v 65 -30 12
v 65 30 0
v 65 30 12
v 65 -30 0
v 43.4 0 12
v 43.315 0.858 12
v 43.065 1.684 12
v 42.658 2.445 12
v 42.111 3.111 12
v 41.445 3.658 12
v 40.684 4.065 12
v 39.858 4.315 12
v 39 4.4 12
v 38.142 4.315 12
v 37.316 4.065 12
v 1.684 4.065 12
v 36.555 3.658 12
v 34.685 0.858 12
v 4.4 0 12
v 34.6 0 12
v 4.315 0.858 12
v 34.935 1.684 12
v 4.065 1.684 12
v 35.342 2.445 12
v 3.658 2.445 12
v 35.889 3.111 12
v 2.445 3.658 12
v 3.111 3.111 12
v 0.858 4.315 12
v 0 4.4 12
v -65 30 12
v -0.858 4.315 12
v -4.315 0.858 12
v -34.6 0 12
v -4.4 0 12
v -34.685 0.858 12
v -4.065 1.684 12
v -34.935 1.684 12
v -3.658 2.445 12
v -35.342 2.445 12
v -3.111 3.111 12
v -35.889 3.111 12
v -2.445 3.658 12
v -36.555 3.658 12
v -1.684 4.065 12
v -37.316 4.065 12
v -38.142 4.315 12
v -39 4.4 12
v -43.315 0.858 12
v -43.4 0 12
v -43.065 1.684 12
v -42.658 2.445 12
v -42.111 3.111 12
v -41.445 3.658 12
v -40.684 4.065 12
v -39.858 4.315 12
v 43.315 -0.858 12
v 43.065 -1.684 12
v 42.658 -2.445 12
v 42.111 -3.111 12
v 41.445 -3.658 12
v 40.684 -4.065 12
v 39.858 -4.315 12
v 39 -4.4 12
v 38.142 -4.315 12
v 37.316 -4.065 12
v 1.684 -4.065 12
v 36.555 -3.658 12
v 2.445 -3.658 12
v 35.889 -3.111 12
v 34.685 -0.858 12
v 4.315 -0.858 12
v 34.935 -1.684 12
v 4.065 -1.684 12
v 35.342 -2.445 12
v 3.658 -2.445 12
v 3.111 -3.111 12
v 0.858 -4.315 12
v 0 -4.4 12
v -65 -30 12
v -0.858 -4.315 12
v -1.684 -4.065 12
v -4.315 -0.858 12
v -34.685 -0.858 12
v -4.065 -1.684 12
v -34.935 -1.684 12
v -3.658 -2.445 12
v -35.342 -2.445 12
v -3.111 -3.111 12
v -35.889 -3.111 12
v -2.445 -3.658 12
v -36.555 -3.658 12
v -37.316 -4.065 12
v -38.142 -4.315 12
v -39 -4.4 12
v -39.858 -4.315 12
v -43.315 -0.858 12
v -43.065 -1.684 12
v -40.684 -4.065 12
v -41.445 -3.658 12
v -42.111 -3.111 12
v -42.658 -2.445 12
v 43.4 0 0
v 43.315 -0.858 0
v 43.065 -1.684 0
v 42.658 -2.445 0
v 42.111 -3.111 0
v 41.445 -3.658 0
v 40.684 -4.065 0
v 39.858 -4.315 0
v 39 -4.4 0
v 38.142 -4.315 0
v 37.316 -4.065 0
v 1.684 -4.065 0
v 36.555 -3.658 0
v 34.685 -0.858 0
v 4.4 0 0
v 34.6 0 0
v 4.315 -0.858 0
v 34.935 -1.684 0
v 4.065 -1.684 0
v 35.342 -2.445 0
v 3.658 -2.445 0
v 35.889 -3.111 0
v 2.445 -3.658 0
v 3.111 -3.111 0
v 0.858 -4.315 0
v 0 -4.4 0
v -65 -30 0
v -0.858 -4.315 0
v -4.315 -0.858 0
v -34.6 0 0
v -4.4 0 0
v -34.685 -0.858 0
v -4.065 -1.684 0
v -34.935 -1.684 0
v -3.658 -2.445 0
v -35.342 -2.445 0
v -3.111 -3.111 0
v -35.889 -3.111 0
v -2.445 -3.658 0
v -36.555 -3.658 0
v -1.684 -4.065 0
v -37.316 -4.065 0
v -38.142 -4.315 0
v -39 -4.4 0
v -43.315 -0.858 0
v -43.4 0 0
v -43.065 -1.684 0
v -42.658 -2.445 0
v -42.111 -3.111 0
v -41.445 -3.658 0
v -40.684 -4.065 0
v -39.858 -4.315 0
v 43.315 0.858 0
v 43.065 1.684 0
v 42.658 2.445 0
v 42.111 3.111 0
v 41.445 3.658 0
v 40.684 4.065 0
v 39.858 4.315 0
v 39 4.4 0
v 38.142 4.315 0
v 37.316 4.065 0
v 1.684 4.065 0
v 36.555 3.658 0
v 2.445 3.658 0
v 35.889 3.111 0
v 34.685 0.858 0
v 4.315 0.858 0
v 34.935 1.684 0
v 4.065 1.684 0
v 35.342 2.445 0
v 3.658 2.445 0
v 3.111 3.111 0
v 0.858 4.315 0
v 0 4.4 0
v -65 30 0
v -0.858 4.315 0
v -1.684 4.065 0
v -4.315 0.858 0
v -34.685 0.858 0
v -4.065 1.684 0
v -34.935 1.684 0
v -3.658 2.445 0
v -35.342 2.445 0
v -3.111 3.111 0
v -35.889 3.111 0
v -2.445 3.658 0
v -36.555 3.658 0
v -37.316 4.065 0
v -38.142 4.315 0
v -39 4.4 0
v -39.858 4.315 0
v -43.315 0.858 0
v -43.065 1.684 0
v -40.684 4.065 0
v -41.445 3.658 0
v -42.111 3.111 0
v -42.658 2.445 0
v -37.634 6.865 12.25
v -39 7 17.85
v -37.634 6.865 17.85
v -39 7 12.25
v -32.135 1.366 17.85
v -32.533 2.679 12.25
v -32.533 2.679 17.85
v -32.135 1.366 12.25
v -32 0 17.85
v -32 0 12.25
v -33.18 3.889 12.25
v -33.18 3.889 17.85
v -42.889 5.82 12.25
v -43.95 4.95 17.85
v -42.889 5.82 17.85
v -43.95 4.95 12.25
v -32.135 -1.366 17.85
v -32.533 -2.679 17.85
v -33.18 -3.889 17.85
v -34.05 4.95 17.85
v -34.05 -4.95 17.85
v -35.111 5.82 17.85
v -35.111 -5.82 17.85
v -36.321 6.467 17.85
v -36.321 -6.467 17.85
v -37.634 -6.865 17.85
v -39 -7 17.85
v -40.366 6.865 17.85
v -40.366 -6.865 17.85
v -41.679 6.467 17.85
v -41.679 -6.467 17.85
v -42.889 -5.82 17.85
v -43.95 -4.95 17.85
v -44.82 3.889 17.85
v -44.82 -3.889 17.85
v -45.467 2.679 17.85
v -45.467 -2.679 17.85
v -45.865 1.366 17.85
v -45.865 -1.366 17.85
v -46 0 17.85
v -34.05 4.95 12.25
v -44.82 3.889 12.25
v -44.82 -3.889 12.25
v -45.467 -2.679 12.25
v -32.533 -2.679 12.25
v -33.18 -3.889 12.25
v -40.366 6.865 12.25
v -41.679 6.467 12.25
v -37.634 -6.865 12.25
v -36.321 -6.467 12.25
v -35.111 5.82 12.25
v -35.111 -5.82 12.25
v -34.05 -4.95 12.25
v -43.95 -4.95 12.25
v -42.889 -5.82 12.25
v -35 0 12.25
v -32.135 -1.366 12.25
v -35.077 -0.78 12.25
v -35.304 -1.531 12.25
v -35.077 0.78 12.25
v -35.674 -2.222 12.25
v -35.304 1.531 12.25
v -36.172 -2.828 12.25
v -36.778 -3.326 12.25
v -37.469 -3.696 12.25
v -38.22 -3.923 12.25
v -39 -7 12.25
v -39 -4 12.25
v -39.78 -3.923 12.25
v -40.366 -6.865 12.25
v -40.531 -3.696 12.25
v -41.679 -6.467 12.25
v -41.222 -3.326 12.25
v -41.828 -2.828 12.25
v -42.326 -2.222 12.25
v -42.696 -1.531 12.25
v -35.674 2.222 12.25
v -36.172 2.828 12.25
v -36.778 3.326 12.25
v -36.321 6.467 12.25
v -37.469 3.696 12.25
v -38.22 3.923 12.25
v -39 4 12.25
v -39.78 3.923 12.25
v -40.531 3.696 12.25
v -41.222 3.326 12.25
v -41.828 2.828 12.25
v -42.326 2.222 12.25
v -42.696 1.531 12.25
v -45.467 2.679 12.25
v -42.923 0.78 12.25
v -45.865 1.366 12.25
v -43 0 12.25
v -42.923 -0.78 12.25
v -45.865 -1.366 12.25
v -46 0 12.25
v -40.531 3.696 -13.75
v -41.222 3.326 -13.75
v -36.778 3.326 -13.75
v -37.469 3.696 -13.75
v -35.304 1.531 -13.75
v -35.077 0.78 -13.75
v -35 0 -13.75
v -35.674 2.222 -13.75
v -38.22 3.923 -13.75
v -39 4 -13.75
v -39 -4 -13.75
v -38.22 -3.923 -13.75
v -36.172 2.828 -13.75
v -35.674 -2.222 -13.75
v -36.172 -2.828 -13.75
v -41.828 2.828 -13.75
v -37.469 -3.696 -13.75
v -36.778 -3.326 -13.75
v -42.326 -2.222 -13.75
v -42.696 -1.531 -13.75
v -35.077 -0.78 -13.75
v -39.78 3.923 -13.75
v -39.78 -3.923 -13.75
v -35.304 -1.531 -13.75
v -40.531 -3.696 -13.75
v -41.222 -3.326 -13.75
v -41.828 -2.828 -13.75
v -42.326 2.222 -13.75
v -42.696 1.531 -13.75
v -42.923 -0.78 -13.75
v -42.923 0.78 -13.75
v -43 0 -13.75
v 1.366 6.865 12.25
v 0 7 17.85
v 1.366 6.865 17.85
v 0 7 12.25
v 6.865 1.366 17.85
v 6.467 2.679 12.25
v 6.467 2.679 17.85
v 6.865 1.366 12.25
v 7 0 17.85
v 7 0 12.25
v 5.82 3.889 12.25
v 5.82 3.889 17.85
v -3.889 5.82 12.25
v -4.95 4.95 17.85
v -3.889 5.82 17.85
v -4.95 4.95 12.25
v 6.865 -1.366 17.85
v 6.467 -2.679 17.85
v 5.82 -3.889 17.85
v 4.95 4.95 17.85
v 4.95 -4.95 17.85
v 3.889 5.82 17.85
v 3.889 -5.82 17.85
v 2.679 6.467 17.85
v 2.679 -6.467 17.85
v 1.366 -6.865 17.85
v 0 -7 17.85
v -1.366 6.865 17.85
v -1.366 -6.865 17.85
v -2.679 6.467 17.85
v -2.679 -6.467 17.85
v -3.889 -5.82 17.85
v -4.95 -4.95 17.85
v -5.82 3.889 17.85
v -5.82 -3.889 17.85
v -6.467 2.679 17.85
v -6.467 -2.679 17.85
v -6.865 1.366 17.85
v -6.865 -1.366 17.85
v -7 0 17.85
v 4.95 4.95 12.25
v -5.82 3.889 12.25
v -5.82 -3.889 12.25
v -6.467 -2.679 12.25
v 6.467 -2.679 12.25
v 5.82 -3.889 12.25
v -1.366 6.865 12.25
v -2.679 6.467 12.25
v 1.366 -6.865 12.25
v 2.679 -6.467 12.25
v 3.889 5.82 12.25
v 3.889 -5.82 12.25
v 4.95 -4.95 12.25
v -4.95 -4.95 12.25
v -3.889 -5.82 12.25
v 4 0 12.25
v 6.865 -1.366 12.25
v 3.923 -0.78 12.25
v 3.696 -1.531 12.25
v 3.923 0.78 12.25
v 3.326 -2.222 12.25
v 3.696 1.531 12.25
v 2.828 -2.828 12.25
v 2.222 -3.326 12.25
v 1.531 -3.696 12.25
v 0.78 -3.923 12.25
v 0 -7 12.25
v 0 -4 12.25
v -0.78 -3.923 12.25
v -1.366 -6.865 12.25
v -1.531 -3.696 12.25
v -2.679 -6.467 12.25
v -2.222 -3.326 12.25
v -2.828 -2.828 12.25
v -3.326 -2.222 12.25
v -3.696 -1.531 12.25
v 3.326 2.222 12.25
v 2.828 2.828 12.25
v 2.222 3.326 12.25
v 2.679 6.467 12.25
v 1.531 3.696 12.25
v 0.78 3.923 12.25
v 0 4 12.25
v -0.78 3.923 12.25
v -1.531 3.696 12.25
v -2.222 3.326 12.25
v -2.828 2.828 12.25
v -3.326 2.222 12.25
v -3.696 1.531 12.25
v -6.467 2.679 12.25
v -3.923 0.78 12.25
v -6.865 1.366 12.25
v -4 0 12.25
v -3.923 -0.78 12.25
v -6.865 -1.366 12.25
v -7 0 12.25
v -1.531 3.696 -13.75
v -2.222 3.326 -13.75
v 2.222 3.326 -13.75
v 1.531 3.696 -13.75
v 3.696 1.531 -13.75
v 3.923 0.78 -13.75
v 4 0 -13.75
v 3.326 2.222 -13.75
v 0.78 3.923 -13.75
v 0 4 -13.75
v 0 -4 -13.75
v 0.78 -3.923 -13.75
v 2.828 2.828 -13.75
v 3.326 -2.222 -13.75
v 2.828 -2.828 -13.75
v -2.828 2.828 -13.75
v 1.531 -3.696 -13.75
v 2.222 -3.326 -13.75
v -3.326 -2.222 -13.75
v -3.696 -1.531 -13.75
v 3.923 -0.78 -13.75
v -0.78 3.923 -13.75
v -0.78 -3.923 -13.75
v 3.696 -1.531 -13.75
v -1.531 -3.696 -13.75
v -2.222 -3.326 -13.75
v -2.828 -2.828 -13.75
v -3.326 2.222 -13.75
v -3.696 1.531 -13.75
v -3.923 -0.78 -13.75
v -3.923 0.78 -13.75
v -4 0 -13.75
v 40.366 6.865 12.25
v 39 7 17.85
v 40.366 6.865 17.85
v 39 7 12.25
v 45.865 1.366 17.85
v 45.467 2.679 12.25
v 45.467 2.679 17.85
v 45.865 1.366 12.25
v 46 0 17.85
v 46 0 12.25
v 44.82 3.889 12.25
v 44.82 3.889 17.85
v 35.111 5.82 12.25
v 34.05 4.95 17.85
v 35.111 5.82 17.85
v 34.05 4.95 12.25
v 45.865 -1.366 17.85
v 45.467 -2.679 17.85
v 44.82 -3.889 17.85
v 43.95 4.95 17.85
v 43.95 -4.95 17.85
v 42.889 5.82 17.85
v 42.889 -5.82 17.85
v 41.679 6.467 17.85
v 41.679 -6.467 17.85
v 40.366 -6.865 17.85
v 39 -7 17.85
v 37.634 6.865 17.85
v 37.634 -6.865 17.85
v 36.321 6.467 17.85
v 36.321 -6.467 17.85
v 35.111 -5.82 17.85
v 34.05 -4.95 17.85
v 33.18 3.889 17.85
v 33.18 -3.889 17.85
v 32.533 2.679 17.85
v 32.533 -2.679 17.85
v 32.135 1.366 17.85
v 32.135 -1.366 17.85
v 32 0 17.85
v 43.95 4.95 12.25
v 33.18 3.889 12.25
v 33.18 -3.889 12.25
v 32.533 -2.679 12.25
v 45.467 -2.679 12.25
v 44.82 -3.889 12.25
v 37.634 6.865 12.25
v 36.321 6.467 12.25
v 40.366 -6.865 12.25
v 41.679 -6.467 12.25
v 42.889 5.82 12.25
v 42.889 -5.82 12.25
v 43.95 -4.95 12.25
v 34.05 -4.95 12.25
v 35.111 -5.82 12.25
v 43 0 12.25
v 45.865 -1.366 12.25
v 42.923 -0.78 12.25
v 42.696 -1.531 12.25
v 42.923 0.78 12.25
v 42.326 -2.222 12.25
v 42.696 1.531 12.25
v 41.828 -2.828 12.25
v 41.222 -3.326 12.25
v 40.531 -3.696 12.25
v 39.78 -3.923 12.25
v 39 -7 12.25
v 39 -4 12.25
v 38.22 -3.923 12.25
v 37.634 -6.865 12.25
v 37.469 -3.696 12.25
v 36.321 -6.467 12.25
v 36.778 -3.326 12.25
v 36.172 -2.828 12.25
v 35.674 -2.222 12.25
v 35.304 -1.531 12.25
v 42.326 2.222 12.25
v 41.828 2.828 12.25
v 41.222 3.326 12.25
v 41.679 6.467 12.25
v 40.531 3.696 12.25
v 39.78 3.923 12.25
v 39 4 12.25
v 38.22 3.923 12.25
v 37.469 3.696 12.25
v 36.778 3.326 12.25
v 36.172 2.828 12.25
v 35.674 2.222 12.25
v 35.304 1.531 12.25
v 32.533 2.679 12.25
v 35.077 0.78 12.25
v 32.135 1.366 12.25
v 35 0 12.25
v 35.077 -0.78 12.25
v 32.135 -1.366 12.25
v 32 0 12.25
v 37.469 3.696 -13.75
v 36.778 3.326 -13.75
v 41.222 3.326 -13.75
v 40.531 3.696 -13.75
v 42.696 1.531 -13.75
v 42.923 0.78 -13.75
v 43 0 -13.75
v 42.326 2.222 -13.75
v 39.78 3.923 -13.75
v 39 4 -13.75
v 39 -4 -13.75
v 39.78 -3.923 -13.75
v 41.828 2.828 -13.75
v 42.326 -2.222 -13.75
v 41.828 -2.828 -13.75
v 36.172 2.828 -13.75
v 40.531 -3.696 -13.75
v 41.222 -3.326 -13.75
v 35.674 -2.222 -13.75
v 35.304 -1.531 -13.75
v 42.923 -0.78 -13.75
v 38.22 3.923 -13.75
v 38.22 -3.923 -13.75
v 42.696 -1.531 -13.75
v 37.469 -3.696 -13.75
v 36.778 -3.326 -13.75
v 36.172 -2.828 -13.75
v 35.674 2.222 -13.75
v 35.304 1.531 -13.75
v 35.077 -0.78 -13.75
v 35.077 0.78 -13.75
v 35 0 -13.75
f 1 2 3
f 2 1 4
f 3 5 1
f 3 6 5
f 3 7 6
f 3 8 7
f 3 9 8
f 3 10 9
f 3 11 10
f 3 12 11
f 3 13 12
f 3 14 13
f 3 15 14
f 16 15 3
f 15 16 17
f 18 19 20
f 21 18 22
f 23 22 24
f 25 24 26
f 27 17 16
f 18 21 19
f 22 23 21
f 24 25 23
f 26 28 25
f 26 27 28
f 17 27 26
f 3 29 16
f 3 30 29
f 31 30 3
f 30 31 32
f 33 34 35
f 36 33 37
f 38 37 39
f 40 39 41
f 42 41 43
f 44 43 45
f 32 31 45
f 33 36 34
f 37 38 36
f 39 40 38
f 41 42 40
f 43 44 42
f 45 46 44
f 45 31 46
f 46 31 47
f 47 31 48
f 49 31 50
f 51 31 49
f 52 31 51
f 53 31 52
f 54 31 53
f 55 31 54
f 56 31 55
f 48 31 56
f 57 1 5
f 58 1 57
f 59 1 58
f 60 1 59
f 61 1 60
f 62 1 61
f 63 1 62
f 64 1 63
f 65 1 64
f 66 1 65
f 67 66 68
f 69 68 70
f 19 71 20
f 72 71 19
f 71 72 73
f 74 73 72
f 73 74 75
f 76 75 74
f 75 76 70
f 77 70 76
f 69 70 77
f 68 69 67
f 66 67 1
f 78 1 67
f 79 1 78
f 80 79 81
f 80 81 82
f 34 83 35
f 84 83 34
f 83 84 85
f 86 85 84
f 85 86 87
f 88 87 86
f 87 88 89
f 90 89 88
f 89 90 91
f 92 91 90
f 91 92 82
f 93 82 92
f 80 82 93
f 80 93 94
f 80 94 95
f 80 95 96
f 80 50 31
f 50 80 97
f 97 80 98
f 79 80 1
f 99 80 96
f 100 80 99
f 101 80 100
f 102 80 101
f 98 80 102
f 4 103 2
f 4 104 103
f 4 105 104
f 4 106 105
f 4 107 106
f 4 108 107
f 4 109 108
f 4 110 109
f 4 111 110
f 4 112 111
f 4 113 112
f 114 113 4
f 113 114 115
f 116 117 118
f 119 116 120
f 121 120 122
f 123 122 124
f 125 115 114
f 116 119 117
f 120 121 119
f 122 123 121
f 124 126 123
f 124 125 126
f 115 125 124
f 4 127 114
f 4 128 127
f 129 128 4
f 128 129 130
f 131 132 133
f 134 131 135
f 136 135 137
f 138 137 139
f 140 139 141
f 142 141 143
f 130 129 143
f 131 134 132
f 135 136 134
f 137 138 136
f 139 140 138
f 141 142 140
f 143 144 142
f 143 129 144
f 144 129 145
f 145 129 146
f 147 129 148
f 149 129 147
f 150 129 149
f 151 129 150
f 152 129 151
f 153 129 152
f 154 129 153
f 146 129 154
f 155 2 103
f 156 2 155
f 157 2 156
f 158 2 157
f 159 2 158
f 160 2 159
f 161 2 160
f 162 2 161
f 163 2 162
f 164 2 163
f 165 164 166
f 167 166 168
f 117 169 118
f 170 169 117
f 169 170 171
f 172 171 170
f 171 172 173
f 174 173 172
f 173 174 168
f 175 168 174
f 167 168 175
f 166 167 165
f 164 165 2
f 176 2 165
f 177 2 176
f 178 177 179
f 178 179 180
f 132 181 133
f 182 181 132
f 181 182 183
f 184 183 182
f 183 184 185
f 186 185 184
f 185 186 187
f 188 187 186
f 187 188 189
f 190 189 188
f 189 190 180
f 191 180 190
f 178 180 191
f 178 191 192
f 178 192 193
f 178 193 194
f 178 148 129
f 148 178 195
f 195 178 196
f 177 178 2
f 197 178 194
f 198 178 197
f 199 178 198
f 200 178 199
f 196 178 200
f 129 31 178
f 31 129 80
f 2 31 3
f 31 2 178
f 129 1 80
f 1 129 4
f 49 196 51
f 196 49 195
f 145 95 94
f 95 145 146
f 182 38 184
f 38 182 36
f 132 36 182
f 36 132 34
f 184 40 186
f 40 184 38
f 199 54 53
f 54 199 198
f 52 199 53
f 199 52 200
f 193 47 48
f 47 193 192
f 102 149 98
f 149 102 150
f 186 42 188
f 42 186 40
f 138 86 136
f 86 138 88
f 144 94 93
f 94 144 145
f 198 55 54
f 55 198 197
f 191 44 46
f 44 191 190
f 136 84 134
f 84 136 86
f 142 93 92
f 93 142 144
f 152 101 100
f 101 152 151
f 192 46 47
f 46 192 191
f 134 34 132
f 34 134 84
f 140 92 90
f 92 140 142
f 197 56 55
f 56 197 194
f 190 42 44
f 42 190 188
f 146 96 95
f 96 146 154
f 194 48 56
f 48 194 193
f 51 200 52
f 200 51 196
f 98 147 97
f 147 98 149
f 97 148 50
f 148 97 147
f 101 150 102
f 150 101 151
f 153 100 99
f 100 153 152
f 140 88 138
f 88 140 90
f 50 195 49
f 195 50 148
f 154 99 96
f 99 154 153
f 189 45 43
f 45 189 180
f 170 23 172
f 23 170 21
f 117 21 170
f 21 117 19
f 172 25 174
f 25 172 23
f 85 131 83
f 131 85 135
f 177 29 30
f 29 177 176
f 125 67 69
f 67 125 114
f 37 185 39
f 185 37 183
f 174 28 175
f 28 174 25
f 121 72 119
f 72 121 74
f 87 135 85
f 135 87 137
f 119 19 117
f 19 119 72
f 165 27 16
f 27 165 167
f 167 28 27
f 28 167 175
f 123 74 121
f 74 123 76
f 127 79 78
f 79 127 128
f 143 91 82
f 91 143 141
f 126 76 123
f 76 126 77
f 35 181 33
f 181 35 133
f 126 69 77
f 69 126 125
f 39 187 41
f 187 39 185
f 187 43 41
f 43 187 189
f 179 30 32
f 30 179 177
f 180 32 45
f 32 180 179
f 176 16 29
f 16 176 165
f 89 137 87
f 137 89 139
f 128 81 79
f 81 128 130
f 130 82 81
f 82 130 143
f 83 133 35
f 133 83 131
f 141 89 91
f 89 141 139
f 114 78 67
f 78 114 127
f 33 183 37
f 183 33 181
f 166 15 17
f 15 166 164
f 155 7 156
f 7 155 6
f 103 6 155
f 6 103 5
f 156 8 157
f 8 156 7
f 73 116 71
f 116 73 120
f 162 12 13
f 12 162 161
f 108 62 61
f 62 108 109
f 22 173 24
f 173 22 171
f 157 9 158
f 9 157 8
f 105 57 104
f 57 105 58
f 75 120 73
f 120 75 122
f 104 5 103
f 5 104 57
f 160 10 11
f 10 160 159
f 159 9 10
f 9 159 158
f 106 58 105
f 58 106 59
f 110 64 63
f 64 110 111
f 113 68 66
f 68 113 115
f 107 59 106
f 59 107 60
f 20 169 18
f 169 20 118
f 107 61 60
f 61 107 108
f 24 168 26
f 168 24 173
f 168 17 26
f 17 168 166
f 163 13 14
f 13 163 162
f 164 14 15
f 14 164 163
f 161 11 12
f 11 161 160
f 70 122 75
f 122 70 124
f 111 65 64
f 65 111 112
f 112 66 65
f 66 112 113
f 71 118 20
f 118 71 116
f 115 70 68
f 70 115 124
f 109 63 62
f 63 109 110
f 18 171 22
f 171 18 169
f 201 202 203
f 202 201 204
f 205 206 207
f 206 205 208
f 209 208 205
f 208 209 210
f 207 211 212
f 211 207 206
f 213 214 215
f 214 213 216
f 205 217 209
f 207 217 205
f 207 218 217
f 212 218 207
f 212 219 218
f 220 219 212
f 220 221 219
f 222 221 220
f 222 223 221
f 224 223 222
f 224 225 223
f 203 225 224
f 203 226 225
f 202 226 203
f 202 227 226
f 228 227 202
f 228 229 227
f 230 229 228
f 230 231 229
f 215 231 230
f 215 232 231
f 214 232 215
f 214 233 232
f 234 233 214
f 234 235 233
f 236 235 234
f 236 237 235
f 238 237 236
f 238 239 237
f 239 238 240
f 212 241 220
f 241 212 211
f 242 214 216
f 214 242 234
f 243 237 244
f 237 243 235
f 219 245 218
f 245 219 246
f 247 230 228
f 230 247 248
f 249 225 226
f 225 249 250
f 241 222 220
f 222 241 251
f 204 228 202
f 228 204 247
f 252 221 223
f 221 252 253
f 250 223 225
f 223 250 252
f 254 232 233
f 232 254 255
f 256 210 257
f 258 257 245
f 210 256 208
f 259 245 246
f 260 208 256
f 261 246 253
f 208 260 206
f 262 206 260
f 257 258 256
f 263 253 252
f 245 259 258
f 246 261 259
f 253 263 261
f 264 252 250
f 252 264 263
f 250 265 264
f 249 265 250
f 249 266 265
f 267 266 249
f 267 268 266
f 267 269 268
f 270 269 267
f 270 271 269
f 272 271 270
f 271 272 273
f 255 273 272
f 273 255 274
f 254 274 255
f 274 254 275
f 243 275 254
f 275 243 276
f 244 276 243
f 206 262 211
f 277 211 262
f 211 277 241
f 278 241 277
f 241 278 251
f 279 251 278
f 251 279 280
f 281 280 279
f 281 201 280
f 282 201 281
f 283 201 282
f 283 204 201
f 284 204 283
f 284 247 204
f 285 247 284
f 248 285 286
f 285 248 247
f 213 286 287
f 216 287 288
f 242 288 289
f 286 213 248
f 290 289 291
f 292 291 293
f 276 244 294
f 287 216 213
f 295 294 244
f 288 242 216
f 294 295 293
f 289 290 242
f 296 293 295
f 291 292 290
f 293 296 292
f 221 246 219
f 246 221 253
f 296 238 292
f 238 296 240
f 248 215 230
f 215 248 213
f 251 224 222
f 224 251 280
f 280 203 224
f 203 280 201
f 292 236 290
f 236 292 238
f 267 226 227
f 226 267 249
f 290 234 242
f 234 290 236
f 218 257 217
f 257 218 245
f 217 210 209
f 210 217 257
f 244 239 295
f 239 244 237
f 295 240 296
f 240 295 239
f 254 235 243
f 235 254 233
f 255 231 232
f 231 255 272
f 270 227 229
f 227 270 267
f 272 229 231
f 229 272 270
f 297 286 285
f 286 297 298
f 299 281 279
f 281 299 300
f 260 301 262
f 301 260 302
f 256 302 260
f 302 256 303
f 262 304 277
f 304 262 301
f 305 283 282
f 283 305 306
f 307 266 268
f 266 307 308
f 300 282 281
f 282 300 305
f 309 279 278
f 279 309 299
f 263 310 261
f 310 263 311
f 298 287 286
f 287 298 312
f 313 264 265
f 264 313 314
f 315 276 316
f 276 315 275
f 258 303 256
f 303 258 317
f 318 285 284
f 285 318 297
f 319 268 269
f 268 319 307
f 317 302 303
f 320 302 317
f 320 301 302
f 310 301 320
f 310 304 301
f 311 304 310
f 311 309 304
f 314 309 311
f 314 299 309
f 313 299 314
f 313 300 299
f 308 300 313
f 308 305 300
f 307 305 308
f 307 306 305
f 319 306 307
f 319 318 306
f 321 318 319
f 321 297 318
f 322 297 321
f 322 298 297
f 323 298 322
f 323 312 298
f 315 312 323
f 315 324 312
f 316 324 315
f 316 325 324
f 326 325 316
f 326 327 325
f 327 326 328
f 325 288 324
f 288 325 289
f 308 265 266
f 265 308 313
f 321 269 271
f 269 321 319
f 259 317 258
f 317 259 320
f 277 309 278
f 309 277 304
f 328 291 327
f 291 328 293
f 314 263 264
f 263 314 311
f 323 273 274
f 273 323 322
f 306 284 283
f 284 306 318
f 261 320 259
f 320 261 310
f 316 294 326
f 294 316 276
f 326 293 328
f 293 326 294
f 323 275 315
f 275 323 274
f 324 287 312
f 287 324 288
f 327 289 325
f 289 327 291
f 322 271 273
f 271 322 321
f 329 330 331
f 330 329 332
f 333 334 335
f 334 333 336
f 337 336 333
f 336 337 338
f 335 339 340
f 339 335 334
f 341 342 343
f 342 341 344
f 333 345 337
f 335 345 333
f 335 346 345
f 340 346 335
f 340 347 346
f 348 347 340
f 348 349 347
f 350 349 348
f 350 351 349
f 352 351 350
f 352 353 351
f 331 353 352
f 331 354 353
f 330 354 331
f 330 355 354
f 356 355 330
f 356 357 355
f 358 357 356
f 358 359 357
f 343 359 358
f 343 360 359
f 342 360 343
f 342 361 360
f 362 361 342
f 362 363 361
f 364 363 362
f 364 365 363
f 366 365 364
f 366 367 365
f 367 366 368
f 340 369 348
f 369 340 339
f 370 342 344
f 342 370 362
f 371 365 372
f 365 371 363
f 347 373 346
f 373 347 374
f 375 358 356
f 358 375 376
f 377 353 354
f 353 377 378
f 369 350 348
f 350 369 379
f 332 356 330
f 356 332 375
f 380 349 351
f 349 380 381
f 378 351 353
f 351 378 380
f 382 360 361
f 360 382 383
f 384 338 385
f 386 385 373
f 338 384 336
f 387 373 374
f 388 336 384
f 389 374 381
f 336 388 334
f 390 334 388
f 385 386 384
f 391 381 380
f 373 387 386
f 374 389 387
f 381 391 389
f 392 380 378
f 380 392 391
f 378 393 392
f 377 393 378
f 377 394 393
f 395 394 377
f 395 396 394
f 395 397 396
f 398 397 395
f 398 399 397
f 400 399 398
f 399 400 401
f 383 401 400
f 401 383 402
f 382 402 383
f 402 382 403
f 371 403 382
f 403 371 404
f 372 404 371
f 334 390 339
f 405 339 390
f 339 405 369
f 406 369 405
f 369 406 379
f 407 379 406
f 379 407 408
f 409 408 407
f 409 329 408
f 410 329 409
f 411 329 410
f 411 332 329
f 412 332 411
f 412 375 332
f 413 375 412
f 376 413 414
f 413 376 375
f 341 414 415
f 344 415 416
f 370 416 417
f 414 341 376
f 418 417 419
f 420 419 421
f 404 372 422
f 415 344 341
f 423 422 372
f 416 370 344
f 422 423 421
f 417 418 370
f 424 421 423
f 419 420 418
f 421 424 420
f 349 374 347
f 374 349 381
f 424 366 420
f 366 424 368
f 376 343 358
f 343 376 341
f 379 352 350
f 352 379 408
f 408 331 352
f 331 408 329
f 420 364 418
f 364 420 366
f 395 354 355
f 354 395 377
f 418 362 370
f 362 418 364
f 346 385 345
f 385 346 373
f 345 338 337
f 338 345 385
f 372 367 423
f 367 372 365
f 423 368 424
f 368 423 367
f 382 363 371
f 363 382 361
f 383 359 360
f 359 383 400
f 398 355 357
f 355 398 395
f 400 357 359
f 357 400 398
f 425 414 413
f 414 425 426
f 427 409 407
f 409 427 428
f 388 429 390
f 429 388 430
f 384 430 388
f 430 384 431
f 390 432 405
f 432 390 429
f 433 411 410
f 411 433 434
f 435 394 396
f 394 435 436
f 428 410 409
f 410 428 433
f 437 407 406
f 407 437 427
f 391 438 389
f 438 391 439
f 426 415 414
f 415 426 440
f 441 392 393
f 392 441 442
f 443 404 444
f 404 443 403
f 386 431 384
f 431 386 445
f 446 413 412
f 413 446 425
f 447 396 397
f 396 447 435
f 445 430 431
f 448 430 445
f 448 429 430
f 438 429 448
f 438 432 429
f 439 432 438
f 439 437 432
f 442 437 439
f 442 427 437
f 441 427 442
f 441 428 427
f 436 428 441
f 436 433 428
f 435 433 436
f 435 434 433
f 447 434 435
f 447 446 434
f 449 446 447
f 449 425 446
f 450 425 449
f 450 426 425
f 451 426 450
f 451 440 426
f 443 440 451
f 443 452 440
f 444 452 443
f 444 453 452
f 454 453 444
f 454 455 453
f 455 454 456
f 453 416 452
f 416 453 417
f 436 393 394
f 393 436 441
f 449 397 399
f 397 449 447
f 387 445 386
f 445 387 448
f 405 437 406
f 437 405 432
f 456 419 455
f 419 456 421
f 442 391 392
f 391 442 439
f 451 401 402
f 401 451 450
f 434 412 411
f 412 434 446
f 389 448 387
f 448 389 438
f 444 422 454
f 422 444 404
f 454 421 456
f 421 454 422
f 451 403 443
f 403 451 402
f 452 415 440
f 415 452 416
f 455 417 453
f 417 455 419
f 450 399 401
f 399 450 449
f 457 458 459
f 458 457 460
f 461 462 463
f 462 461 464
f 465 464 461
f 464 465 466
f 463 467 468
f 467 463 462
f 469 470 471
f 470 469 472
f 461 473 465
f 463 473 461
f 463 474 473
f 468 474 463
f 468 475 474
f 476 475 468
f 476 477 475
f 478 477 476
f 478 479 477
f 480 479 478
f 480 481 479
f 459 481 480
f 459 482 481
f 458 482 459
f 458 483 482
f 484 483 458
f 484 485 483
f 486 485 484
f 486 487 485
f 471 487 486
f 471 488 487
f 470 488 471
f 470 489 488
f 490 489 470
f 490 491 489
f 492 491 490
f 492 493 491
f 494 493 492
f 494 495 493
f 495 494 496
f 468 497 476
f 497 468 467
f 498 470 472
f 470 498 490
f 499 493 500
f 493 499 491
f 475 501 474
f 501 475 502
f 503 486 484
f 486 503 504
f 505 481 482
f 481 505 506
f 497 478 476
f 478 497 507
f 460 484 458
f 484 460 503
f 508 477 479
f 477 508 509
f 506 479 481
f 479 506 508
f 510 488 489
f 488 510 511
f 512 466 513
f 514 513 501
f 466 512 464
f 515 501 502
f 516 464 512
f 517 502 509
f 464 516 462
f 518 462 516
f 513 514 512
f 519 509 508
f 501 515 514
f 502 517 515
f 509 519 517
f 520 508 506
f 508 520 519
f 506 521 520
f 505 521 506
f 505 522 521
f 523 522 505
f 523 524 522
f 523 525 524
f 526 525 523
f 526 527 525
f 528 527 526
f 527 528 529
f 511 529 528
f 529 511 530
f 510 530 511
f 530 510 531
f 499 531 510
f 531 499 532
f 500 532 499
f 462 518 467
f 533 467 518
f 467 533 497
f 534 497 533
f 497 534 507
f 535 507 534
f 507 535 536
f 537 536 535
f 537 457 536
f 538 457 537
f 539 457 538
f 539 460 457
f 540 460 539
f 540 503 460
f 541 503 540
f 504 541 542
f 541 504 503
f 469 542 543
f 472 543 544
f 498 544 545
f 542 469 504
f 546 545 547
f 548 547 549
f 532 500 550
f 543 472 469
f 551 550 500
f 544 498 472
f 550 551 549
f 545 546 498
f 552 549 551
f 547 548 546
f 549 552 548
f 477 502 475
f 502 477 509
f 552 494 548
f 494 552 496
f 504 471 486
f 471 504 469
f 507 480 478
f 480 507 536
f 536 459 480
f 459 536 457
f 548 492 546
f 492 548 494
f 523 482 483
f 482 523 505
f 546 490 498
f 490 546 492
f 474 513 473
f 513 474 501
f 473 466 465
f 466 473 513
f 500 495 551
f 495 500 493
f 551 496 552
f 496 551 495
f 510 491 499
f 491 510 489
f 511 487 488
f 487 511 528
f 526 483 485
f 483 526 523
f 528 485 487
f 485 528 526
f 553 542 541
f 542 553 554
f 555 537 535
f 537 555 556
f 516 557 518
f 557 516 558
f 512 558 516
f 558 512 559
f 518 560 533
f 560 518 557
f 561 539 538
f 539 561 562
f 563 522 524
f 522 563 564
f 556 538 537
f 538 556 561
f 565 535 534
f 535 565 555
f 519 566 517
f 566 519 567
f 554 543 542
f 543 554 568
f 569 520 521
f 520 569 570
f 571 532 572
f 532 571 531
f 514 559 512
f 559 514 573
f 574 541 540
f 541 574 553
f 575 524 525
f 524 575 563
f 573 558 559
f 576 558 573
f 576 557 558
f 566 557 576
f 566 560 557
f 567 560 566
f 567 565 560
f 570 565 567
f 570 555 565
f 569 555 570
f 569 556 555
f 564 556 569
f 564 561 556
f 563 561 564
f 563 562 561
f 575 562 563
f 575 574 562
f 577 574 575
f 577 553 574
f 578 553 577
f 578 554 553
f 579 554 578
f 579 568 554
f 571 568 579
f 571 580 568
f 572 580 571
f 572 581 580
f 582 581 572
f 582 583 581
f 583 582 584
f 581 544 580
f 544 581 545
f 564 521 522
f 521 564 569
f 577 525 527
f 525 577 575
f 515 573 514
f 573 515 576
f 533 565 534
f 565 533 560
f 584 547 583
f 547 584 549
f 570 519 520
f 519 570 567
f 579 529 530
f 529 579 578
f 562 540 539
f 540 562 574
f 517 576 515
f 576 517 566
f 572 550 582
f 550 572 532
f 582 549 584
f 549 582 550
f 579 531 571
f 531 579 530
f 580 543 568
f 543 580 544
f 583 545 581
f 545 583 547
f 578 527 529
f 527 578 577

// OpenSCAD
$fn = 32;

// ------------------------------------------------------------------------
// Bolted plate: 130 x 60 x 12 mm plate, 3 fasteners
// Every part is its own module, assembly() places them once.
// ------------------------------------------------------------------------

// --- part 1 ---
module plate() {
  difference() {
    translate([-65, -30, 0]) cube([130, 60, 12]);
    translate([-39, 0, -1]) cylinder(h = 14, d = 8.8);
    translate([0, 0, -1]) cylinder(h = 14, d = 8.8);
    translate([39, 0, -1]) cylinder(h = 14, d = 8.8);
  }
}

// --- part 2 ---
module bolt1() {
  cylinder(h = 5.6, d = 14);
  translate([0, 0, -26]) cylinder(h = 26, d = 8);
}

// --- part 3 ---
module bolt2() {
  cylinder(h = 5.6, d = 14);
  translate([0, 0, -26]) cylinder(h = 26, d = 8);
}

// --- part 4 ---
module bolt3() {
  cylinder(h = 5.6, d = 14);
  translate([0, 0, -26]) cylinder(h = 26, d = 8);
}

// --- assembly ---
module assembly() {
  translate([0, 0, 0]) rotate([0, 0, 0]) plate();
  translate([-39, 0, 12.25]) rotate([0, 0, 0]) bolt1();
  translate([0, 0, 12.25]) rotate([0, 0, 0]) bolt2();
  translate([39, 0, 12.25]) rotate([0, 0, 0]) bolt3();
}

assembly();
